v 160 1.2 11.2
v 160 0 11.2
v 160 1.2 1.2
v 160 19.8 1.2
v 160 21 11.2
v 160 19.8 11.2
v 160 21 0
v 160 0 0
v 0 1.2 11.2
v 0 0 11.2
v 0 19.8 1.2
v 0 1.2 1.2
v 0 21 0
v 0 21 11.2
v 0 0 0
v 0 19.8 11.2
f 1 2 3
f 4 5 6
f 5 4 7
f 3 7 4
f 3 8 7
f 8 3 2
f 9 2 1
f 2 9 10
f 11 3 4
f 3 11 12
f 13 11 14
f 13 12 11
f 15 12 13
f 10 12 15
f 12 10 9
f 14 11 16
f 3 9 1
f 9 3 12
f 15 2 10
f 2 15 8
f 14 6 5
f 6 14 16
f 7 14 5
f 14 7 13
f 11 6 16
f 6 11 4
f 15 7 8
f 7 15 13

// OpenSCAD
// ScienceClaw nominal U-channel. All dimensions in millimeters.
// Clamp the first clamp_length along x. No holes or clamp reinforcement.
// Print parameters, layer orientation, material batch, and actual dimensions
// must be recorded separately; this file does not prescribe a qualified process.
length = 160;
clamp_length = 25;
base_width = 21;
wall_height = 10;
thickness = 1.2;
assert(length > clamp_length && clamp_length > 0);
assert(base_width > 2 * thickness && thickness > 0 && wall_height >= 0);
union() {
    cube([length, base_width, thickness]);
    if (wall_height > 0) {
        translate([0, 0, thickness]) cube([length, thickness, wall_height]);
        translate([0, base_width - thickness, thickness]) cube([length, thickness, wall_height]);
    }
}
